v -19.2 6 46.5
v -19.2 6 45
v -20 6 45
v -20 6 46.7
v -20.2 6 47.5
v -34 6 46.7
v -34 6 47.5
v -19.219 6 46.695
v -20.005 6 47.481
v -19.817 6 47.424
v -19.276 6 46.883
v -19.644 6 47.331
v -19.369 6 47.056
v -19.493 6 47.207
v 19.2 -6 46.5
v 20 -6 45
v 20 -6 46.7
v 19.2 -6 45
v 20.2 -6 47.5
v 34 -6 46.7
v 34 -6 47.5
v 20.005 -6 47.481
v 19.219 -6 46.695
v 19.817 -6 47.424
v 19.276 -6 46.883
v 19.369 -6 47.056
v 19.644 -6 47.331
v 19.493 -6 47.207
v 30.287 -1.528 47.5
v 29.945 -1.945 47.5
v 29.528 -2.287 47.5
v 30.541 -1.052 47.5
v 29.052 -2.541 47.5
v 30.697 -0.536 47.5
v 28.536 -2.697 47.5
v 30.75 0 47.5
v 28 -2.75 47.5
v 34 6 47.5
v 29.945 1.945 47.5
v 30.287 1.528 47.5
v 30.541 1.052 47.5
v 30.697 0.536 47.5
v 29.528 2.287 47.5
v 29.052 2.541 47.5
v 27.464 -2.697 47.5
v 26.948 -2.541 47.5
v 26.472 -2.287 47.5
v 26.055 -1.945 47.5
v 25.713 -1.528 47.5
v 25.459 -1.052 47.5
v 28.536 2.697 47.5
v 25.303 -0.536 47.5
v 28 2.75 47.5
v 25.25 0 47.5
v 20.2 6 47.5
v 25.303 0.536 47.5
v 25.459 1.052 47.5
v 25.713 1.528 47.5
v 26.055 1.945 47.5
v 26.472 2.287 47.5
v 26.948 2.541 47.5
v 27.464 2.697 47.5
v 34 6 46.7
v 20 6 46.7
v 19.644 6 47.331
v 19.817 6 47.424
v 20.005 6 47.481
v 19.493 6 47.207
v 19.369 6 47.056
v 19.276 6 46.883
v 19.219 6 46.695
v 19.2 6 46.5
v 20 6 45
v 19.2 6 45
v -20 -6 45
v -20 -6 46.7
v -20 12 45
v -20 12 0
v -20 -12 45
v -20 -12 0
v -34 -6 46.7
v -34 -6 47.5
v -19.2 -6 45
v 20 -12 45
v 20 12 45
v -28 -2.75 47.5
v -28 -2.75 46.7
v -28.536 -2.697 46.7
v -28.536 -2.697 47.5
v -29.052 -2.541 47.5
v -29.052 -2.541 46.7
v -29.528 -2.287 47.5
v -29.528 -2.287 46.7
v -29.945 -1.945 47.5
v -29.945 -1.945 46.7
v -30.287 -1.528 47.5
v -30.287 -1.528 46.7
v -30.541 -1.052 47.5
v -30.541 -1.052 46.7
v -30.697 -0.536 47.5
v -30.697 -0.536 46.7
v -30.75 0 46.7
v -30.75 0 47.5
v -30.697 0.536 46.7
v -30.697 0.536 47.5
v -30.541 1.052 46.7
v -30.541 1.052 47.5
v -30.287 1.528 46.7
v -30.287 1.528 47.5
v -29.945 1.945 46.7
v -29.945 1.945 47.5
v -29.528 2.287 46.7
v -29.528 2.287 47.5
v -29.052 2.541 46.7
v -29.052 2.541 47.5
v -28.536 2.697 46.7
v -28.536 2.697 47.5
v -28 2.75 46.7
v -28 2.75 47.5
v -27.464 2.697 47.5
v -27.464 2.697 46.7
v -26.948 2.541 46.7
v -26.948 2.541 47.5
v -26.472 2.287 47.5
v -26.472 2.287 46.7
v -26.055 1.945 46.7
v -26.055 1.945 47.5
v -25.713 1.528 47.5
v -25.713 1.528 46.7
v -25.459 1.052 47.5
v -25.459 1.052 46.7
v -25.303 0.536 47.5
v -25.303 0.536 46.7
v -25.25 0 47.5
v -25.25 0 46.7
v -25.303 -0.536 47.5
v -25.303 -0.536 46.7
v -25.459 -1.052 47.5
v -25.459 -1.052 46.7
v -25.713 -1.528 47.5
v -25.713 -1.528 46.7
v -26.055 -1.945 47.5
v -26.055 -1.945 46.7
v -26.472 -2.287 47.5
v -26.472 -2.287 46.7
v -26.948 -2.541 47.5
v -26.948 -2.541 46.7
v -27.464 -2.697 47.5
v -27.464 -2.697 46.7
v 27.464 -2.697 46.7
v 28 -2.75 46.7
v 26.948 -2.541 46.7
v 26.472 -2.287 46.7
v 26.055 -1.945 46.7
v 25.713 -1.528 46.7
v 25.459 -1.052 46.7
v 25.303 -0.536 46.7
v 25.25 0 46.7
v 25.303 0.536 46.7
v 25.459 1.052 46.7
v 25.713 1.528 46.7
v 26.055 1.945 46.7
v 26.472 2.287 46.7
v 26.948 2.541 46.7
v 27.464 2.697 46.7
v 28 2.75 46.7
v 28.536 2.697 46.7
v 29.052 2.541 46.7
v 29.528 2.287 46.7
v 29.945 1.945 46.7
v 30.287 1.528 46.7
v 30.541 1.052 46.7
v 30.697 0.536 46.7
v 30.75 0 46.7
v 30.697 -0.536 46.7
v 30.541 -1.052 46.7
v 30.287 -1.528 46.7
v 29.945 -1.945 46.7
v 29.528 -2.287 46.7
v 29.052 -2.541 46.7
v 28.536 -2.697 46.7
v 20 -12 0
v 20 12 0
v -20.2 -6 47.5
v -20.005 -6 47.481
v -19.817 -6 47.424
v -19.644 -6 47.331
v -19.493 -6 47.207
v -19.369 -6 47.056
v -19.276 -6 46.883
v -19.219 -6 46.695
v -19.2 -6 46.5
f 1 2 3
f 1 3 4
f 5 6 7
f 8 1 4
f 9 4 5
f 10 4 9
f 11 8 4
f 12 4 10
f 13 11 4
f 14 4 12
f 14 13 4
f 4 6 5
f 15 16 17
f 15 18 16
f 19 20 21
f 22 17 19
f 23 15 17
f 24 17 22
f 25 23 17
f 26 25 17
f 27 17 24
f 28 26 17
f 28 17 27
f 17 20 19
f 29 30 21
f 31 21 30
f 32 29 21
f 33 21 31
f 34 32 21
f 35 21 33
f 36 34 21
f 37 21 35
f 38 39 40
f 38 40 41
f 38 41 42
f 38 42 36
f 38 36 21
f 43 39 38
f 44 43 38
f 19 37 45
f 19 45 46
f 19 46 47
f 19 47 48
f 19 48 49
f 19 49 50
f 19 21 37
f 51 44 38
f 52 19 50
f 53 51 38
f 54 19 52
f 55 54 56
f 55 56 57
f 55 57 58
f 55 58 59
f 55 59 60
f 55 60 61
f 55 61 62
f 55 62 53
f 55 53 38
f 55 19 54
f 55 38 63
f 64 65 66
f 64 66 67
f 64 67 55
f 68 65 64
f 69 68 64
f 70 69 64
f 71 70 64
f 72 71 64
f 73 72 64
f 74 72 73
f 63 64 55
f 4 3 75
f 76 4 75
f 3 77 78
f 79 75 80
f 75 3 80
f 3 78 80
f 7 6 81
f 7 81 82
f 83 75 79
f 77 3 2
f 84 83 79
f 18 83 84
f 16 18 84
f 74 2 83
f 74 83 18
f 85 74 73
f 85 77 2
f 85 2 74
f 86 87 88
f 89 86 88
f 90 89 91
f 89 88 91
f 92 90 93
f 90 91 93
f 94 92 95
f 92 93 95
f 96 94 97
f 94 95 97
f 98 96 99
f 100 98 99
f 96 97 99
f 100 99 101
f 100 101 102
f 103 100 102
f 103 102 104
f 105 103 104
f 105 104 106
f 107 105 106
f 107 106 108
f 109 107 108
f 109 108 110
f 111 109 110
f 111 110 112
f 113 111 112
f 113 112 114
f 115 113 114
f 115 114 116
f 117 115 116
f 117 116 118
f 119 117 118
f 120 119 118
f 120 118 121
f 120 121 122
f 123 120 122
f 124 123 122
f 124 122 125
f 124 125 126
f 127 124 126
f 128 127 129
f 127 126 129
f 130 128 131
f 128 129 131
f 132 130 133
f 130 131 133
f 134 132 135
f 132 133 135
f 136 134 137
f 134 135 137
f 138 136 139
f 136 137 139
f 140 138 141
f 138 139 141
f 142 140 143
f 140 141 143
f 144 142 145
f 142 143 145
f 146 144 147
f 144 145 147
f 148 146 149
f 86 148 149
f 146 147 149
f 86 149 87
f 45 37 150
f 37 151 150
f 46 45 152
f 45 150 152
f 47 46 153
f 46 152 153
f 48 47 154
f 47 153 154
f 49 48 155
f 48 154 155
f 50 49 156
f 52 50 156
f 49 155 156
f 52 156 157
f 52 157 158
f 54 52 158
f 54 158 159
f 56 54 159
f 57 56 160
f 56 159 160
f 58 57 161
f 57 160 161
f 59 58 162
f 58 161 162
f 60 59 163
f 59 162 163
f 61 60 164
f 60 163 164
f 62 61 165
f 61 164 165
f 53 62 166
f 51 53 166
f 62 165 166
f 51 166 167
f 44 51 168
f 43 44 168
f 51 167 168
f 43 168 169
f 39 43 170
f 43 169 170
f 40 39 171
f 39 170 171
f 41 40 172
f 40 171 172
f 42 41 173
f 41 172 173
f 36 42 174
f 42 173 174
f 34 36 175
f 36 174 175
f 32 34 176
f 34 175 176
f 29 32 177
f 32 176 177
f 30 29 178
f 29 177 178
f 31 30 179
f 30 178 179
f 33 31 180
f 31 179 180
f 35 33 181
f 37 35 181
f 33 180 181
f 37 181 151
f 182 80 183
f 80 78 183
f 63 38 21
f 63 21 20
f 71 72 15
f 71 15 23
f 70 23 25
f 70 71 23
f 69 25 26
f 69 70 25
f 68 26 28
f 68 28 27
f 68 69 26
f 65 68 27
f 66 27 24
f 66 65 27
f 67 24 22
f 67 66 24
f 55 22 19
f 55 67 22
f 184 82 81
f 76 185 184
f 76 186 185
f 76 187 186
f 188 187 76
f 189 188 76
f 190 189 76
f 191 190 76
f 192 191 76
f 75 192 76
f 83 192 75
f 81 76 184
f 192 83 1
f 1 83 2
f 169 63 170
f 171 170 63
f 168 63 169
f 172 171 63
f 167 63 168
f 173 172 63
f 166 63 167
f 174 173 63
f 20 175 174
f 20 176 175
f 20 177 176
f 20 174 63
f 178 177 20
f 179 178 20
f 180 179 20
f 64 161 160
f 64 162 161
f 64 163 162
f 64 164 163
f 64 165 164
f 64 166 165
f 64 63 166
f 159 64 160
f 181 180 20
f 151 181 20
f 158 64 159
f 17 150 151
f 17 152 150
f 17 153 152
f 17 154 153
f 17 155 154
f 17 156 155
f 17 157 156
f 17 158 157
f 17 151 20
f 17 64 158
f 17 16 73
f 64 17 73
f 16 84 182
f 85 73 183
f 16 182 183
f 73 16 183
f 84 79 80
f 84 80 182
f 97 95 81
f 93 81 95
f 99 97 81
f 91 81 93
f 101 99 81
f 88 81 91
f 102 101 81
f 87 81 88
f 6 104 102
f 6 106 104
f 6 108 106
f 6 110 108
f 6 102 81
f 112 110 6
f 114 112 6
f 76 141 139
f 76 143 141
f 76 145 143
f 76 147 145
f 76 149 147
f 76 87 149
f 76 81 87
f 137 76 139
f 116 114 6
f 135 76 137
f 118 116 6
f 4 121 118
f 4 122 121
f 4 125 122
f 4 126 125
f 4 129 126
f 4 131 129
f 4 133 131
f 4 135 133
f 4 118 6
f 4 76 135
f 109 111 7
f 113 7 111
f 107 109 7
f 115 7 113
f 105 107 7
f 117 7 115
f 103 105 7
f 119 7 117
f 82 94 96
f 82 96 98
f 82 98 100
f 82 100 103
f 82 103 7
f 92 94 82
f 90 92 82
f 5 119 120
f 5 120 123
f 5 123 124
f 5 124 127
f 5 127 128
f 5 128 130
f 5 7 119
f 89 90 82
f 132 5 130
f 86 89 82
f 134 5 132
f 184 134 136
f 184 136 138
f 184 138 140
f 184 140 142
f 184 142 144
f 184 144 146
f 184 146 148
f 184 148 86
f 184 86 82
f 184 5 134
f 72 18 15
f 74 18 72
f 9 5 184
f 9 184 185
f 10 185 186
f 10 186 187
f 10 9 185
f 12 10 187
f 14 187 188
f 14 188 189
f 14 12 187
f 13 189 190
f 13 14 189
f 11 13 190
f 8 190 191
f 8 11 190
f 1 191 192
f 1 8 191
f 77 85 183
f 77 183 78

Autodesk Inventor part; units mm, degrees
ref_plane "YZ Plane" through (0, 0, 0) normal (1, 0, 0) x (0, 1, 0)
ref_plane "XZ Plane" through (0, 0, 0) normal (0, 1, 0) x (-1, 0, 0)
ref_plane "XY Plane" through (0, 0, 0) normal (0, 0, 1) x (1, 0, 0)
sketch "Sketch1" plane through (0, 0, 0) normal (0, 0, 1) x (1, 0, 0)
  line L0 (-20, -12) -> (20, -12)
  line L1 (20, -12) -> (20, 12)
  line L2 (20, 12) -> (-20, 12)
  line L3 (-20, 12) -> (-20, -12)
  line L4 (-20, -12) -> (20, 12) construction
  line L5 (20, -12) -> (-20, 12) construction
  point P0 (0, 0)
  dimension "d0" = 40
  dimension "d1" = 24
extrude "Extrusion1" add sketch "Sketch1" along normal blind 45
sketch "Sketch2" plane through (0, 0, 45) normal (0, 0, 1) x (1, 0, 0)
  line L0 (-20, -6) -> (-19.2, -6)
  line L1 (-19.2, -6) -> (-19.2, 6)
  line L2 (-19.2, 6) -> (-20, 6)
  line L3 (-20, 6) -> (-20, -6)
  line L4 (20, -12) -> (20, 12) projected
  line L5 (20, -6) -> (19.2, -6)
  line L6 (19.2, -6) -> (19.2, 6)
  line L7 (19.2, 6) -> (20, 6)
  line L8 (20, 6) -> (20, -6)
  point P0 (0, 0)
  point P1 (-20, 12)
  point P2 (-19.2, 0)
  point P3 (19.2, 0)
  dimension "d4" = 12
  dimension "d5" = 0.8
  dimension "d6" = 0.8
extrude "Extrusion2" add sketch "Sketch2" along normal blind 2.5
sketch "Sketch3" plane through (20, -12, 0) normal (1, 0, 0) x (0, 0, -1)
  line L0 (-47.5, 6) -> (-47.5, 18) projected
  line L1 (-47.5, 18) -> (-46.7, 18)
  line L2 (-46.7, 18) -> (-46.7, 6)
  line L3 (-46.7, 6) -> (-47.5, 6)
  line L4 (-47.5, 6) -> (-47.5, 18)
  point P0 (0, 12)
  dimension "d9" = 0.8
extrude "Extrusion3" add sketch "Sketch3" along normal blind 14
sketch "Sketch4" plane through (-20, -12, 0) normal (-1, 0, 0) x (0, 0, 1)
  line L0 (47.5, 18) -> (47.5, 6) projected
  line L1 (45, 18) -> (47.5, 18) projected
  line L2 (47.5, 6) -> (46.7, 6)
  line L3 (46.7, 6) -> (46.7, 18)
  line L4 (46.7, 18) -> (47.5, 18)
  line L5 (47.5, 18) -> (47.5, 6)
  point P0 (0, 12)
  dimension "d12" = 0.8
extrude "Extrusion4" add sketch "Sketch4" along normal blind 14
sketch "Sketch5" plane through (0, 0, 47.5) normal (0, 0, 1) x (1, 0, 0)
  line L0 (-28, 0) -> (28, 0) construction
  point P0 (0, 0)
  point P1 (0, 0)
  dimension "d15" = 56
hole "Hole1" at (-28, 0, 47.5) at (28, 0, 47.5) direction (0, 0, -1) diameter 5.5 end through all clearance for "Countersunk Flat Head Screw DIN EN ISO 2009" size "M5" standard "DIN"
fillet "Fillet1" radius 1 2 edges at (19.2, 0, 47.5) (-19.2, 0, 47.5)
properties part number "Snmubber"
